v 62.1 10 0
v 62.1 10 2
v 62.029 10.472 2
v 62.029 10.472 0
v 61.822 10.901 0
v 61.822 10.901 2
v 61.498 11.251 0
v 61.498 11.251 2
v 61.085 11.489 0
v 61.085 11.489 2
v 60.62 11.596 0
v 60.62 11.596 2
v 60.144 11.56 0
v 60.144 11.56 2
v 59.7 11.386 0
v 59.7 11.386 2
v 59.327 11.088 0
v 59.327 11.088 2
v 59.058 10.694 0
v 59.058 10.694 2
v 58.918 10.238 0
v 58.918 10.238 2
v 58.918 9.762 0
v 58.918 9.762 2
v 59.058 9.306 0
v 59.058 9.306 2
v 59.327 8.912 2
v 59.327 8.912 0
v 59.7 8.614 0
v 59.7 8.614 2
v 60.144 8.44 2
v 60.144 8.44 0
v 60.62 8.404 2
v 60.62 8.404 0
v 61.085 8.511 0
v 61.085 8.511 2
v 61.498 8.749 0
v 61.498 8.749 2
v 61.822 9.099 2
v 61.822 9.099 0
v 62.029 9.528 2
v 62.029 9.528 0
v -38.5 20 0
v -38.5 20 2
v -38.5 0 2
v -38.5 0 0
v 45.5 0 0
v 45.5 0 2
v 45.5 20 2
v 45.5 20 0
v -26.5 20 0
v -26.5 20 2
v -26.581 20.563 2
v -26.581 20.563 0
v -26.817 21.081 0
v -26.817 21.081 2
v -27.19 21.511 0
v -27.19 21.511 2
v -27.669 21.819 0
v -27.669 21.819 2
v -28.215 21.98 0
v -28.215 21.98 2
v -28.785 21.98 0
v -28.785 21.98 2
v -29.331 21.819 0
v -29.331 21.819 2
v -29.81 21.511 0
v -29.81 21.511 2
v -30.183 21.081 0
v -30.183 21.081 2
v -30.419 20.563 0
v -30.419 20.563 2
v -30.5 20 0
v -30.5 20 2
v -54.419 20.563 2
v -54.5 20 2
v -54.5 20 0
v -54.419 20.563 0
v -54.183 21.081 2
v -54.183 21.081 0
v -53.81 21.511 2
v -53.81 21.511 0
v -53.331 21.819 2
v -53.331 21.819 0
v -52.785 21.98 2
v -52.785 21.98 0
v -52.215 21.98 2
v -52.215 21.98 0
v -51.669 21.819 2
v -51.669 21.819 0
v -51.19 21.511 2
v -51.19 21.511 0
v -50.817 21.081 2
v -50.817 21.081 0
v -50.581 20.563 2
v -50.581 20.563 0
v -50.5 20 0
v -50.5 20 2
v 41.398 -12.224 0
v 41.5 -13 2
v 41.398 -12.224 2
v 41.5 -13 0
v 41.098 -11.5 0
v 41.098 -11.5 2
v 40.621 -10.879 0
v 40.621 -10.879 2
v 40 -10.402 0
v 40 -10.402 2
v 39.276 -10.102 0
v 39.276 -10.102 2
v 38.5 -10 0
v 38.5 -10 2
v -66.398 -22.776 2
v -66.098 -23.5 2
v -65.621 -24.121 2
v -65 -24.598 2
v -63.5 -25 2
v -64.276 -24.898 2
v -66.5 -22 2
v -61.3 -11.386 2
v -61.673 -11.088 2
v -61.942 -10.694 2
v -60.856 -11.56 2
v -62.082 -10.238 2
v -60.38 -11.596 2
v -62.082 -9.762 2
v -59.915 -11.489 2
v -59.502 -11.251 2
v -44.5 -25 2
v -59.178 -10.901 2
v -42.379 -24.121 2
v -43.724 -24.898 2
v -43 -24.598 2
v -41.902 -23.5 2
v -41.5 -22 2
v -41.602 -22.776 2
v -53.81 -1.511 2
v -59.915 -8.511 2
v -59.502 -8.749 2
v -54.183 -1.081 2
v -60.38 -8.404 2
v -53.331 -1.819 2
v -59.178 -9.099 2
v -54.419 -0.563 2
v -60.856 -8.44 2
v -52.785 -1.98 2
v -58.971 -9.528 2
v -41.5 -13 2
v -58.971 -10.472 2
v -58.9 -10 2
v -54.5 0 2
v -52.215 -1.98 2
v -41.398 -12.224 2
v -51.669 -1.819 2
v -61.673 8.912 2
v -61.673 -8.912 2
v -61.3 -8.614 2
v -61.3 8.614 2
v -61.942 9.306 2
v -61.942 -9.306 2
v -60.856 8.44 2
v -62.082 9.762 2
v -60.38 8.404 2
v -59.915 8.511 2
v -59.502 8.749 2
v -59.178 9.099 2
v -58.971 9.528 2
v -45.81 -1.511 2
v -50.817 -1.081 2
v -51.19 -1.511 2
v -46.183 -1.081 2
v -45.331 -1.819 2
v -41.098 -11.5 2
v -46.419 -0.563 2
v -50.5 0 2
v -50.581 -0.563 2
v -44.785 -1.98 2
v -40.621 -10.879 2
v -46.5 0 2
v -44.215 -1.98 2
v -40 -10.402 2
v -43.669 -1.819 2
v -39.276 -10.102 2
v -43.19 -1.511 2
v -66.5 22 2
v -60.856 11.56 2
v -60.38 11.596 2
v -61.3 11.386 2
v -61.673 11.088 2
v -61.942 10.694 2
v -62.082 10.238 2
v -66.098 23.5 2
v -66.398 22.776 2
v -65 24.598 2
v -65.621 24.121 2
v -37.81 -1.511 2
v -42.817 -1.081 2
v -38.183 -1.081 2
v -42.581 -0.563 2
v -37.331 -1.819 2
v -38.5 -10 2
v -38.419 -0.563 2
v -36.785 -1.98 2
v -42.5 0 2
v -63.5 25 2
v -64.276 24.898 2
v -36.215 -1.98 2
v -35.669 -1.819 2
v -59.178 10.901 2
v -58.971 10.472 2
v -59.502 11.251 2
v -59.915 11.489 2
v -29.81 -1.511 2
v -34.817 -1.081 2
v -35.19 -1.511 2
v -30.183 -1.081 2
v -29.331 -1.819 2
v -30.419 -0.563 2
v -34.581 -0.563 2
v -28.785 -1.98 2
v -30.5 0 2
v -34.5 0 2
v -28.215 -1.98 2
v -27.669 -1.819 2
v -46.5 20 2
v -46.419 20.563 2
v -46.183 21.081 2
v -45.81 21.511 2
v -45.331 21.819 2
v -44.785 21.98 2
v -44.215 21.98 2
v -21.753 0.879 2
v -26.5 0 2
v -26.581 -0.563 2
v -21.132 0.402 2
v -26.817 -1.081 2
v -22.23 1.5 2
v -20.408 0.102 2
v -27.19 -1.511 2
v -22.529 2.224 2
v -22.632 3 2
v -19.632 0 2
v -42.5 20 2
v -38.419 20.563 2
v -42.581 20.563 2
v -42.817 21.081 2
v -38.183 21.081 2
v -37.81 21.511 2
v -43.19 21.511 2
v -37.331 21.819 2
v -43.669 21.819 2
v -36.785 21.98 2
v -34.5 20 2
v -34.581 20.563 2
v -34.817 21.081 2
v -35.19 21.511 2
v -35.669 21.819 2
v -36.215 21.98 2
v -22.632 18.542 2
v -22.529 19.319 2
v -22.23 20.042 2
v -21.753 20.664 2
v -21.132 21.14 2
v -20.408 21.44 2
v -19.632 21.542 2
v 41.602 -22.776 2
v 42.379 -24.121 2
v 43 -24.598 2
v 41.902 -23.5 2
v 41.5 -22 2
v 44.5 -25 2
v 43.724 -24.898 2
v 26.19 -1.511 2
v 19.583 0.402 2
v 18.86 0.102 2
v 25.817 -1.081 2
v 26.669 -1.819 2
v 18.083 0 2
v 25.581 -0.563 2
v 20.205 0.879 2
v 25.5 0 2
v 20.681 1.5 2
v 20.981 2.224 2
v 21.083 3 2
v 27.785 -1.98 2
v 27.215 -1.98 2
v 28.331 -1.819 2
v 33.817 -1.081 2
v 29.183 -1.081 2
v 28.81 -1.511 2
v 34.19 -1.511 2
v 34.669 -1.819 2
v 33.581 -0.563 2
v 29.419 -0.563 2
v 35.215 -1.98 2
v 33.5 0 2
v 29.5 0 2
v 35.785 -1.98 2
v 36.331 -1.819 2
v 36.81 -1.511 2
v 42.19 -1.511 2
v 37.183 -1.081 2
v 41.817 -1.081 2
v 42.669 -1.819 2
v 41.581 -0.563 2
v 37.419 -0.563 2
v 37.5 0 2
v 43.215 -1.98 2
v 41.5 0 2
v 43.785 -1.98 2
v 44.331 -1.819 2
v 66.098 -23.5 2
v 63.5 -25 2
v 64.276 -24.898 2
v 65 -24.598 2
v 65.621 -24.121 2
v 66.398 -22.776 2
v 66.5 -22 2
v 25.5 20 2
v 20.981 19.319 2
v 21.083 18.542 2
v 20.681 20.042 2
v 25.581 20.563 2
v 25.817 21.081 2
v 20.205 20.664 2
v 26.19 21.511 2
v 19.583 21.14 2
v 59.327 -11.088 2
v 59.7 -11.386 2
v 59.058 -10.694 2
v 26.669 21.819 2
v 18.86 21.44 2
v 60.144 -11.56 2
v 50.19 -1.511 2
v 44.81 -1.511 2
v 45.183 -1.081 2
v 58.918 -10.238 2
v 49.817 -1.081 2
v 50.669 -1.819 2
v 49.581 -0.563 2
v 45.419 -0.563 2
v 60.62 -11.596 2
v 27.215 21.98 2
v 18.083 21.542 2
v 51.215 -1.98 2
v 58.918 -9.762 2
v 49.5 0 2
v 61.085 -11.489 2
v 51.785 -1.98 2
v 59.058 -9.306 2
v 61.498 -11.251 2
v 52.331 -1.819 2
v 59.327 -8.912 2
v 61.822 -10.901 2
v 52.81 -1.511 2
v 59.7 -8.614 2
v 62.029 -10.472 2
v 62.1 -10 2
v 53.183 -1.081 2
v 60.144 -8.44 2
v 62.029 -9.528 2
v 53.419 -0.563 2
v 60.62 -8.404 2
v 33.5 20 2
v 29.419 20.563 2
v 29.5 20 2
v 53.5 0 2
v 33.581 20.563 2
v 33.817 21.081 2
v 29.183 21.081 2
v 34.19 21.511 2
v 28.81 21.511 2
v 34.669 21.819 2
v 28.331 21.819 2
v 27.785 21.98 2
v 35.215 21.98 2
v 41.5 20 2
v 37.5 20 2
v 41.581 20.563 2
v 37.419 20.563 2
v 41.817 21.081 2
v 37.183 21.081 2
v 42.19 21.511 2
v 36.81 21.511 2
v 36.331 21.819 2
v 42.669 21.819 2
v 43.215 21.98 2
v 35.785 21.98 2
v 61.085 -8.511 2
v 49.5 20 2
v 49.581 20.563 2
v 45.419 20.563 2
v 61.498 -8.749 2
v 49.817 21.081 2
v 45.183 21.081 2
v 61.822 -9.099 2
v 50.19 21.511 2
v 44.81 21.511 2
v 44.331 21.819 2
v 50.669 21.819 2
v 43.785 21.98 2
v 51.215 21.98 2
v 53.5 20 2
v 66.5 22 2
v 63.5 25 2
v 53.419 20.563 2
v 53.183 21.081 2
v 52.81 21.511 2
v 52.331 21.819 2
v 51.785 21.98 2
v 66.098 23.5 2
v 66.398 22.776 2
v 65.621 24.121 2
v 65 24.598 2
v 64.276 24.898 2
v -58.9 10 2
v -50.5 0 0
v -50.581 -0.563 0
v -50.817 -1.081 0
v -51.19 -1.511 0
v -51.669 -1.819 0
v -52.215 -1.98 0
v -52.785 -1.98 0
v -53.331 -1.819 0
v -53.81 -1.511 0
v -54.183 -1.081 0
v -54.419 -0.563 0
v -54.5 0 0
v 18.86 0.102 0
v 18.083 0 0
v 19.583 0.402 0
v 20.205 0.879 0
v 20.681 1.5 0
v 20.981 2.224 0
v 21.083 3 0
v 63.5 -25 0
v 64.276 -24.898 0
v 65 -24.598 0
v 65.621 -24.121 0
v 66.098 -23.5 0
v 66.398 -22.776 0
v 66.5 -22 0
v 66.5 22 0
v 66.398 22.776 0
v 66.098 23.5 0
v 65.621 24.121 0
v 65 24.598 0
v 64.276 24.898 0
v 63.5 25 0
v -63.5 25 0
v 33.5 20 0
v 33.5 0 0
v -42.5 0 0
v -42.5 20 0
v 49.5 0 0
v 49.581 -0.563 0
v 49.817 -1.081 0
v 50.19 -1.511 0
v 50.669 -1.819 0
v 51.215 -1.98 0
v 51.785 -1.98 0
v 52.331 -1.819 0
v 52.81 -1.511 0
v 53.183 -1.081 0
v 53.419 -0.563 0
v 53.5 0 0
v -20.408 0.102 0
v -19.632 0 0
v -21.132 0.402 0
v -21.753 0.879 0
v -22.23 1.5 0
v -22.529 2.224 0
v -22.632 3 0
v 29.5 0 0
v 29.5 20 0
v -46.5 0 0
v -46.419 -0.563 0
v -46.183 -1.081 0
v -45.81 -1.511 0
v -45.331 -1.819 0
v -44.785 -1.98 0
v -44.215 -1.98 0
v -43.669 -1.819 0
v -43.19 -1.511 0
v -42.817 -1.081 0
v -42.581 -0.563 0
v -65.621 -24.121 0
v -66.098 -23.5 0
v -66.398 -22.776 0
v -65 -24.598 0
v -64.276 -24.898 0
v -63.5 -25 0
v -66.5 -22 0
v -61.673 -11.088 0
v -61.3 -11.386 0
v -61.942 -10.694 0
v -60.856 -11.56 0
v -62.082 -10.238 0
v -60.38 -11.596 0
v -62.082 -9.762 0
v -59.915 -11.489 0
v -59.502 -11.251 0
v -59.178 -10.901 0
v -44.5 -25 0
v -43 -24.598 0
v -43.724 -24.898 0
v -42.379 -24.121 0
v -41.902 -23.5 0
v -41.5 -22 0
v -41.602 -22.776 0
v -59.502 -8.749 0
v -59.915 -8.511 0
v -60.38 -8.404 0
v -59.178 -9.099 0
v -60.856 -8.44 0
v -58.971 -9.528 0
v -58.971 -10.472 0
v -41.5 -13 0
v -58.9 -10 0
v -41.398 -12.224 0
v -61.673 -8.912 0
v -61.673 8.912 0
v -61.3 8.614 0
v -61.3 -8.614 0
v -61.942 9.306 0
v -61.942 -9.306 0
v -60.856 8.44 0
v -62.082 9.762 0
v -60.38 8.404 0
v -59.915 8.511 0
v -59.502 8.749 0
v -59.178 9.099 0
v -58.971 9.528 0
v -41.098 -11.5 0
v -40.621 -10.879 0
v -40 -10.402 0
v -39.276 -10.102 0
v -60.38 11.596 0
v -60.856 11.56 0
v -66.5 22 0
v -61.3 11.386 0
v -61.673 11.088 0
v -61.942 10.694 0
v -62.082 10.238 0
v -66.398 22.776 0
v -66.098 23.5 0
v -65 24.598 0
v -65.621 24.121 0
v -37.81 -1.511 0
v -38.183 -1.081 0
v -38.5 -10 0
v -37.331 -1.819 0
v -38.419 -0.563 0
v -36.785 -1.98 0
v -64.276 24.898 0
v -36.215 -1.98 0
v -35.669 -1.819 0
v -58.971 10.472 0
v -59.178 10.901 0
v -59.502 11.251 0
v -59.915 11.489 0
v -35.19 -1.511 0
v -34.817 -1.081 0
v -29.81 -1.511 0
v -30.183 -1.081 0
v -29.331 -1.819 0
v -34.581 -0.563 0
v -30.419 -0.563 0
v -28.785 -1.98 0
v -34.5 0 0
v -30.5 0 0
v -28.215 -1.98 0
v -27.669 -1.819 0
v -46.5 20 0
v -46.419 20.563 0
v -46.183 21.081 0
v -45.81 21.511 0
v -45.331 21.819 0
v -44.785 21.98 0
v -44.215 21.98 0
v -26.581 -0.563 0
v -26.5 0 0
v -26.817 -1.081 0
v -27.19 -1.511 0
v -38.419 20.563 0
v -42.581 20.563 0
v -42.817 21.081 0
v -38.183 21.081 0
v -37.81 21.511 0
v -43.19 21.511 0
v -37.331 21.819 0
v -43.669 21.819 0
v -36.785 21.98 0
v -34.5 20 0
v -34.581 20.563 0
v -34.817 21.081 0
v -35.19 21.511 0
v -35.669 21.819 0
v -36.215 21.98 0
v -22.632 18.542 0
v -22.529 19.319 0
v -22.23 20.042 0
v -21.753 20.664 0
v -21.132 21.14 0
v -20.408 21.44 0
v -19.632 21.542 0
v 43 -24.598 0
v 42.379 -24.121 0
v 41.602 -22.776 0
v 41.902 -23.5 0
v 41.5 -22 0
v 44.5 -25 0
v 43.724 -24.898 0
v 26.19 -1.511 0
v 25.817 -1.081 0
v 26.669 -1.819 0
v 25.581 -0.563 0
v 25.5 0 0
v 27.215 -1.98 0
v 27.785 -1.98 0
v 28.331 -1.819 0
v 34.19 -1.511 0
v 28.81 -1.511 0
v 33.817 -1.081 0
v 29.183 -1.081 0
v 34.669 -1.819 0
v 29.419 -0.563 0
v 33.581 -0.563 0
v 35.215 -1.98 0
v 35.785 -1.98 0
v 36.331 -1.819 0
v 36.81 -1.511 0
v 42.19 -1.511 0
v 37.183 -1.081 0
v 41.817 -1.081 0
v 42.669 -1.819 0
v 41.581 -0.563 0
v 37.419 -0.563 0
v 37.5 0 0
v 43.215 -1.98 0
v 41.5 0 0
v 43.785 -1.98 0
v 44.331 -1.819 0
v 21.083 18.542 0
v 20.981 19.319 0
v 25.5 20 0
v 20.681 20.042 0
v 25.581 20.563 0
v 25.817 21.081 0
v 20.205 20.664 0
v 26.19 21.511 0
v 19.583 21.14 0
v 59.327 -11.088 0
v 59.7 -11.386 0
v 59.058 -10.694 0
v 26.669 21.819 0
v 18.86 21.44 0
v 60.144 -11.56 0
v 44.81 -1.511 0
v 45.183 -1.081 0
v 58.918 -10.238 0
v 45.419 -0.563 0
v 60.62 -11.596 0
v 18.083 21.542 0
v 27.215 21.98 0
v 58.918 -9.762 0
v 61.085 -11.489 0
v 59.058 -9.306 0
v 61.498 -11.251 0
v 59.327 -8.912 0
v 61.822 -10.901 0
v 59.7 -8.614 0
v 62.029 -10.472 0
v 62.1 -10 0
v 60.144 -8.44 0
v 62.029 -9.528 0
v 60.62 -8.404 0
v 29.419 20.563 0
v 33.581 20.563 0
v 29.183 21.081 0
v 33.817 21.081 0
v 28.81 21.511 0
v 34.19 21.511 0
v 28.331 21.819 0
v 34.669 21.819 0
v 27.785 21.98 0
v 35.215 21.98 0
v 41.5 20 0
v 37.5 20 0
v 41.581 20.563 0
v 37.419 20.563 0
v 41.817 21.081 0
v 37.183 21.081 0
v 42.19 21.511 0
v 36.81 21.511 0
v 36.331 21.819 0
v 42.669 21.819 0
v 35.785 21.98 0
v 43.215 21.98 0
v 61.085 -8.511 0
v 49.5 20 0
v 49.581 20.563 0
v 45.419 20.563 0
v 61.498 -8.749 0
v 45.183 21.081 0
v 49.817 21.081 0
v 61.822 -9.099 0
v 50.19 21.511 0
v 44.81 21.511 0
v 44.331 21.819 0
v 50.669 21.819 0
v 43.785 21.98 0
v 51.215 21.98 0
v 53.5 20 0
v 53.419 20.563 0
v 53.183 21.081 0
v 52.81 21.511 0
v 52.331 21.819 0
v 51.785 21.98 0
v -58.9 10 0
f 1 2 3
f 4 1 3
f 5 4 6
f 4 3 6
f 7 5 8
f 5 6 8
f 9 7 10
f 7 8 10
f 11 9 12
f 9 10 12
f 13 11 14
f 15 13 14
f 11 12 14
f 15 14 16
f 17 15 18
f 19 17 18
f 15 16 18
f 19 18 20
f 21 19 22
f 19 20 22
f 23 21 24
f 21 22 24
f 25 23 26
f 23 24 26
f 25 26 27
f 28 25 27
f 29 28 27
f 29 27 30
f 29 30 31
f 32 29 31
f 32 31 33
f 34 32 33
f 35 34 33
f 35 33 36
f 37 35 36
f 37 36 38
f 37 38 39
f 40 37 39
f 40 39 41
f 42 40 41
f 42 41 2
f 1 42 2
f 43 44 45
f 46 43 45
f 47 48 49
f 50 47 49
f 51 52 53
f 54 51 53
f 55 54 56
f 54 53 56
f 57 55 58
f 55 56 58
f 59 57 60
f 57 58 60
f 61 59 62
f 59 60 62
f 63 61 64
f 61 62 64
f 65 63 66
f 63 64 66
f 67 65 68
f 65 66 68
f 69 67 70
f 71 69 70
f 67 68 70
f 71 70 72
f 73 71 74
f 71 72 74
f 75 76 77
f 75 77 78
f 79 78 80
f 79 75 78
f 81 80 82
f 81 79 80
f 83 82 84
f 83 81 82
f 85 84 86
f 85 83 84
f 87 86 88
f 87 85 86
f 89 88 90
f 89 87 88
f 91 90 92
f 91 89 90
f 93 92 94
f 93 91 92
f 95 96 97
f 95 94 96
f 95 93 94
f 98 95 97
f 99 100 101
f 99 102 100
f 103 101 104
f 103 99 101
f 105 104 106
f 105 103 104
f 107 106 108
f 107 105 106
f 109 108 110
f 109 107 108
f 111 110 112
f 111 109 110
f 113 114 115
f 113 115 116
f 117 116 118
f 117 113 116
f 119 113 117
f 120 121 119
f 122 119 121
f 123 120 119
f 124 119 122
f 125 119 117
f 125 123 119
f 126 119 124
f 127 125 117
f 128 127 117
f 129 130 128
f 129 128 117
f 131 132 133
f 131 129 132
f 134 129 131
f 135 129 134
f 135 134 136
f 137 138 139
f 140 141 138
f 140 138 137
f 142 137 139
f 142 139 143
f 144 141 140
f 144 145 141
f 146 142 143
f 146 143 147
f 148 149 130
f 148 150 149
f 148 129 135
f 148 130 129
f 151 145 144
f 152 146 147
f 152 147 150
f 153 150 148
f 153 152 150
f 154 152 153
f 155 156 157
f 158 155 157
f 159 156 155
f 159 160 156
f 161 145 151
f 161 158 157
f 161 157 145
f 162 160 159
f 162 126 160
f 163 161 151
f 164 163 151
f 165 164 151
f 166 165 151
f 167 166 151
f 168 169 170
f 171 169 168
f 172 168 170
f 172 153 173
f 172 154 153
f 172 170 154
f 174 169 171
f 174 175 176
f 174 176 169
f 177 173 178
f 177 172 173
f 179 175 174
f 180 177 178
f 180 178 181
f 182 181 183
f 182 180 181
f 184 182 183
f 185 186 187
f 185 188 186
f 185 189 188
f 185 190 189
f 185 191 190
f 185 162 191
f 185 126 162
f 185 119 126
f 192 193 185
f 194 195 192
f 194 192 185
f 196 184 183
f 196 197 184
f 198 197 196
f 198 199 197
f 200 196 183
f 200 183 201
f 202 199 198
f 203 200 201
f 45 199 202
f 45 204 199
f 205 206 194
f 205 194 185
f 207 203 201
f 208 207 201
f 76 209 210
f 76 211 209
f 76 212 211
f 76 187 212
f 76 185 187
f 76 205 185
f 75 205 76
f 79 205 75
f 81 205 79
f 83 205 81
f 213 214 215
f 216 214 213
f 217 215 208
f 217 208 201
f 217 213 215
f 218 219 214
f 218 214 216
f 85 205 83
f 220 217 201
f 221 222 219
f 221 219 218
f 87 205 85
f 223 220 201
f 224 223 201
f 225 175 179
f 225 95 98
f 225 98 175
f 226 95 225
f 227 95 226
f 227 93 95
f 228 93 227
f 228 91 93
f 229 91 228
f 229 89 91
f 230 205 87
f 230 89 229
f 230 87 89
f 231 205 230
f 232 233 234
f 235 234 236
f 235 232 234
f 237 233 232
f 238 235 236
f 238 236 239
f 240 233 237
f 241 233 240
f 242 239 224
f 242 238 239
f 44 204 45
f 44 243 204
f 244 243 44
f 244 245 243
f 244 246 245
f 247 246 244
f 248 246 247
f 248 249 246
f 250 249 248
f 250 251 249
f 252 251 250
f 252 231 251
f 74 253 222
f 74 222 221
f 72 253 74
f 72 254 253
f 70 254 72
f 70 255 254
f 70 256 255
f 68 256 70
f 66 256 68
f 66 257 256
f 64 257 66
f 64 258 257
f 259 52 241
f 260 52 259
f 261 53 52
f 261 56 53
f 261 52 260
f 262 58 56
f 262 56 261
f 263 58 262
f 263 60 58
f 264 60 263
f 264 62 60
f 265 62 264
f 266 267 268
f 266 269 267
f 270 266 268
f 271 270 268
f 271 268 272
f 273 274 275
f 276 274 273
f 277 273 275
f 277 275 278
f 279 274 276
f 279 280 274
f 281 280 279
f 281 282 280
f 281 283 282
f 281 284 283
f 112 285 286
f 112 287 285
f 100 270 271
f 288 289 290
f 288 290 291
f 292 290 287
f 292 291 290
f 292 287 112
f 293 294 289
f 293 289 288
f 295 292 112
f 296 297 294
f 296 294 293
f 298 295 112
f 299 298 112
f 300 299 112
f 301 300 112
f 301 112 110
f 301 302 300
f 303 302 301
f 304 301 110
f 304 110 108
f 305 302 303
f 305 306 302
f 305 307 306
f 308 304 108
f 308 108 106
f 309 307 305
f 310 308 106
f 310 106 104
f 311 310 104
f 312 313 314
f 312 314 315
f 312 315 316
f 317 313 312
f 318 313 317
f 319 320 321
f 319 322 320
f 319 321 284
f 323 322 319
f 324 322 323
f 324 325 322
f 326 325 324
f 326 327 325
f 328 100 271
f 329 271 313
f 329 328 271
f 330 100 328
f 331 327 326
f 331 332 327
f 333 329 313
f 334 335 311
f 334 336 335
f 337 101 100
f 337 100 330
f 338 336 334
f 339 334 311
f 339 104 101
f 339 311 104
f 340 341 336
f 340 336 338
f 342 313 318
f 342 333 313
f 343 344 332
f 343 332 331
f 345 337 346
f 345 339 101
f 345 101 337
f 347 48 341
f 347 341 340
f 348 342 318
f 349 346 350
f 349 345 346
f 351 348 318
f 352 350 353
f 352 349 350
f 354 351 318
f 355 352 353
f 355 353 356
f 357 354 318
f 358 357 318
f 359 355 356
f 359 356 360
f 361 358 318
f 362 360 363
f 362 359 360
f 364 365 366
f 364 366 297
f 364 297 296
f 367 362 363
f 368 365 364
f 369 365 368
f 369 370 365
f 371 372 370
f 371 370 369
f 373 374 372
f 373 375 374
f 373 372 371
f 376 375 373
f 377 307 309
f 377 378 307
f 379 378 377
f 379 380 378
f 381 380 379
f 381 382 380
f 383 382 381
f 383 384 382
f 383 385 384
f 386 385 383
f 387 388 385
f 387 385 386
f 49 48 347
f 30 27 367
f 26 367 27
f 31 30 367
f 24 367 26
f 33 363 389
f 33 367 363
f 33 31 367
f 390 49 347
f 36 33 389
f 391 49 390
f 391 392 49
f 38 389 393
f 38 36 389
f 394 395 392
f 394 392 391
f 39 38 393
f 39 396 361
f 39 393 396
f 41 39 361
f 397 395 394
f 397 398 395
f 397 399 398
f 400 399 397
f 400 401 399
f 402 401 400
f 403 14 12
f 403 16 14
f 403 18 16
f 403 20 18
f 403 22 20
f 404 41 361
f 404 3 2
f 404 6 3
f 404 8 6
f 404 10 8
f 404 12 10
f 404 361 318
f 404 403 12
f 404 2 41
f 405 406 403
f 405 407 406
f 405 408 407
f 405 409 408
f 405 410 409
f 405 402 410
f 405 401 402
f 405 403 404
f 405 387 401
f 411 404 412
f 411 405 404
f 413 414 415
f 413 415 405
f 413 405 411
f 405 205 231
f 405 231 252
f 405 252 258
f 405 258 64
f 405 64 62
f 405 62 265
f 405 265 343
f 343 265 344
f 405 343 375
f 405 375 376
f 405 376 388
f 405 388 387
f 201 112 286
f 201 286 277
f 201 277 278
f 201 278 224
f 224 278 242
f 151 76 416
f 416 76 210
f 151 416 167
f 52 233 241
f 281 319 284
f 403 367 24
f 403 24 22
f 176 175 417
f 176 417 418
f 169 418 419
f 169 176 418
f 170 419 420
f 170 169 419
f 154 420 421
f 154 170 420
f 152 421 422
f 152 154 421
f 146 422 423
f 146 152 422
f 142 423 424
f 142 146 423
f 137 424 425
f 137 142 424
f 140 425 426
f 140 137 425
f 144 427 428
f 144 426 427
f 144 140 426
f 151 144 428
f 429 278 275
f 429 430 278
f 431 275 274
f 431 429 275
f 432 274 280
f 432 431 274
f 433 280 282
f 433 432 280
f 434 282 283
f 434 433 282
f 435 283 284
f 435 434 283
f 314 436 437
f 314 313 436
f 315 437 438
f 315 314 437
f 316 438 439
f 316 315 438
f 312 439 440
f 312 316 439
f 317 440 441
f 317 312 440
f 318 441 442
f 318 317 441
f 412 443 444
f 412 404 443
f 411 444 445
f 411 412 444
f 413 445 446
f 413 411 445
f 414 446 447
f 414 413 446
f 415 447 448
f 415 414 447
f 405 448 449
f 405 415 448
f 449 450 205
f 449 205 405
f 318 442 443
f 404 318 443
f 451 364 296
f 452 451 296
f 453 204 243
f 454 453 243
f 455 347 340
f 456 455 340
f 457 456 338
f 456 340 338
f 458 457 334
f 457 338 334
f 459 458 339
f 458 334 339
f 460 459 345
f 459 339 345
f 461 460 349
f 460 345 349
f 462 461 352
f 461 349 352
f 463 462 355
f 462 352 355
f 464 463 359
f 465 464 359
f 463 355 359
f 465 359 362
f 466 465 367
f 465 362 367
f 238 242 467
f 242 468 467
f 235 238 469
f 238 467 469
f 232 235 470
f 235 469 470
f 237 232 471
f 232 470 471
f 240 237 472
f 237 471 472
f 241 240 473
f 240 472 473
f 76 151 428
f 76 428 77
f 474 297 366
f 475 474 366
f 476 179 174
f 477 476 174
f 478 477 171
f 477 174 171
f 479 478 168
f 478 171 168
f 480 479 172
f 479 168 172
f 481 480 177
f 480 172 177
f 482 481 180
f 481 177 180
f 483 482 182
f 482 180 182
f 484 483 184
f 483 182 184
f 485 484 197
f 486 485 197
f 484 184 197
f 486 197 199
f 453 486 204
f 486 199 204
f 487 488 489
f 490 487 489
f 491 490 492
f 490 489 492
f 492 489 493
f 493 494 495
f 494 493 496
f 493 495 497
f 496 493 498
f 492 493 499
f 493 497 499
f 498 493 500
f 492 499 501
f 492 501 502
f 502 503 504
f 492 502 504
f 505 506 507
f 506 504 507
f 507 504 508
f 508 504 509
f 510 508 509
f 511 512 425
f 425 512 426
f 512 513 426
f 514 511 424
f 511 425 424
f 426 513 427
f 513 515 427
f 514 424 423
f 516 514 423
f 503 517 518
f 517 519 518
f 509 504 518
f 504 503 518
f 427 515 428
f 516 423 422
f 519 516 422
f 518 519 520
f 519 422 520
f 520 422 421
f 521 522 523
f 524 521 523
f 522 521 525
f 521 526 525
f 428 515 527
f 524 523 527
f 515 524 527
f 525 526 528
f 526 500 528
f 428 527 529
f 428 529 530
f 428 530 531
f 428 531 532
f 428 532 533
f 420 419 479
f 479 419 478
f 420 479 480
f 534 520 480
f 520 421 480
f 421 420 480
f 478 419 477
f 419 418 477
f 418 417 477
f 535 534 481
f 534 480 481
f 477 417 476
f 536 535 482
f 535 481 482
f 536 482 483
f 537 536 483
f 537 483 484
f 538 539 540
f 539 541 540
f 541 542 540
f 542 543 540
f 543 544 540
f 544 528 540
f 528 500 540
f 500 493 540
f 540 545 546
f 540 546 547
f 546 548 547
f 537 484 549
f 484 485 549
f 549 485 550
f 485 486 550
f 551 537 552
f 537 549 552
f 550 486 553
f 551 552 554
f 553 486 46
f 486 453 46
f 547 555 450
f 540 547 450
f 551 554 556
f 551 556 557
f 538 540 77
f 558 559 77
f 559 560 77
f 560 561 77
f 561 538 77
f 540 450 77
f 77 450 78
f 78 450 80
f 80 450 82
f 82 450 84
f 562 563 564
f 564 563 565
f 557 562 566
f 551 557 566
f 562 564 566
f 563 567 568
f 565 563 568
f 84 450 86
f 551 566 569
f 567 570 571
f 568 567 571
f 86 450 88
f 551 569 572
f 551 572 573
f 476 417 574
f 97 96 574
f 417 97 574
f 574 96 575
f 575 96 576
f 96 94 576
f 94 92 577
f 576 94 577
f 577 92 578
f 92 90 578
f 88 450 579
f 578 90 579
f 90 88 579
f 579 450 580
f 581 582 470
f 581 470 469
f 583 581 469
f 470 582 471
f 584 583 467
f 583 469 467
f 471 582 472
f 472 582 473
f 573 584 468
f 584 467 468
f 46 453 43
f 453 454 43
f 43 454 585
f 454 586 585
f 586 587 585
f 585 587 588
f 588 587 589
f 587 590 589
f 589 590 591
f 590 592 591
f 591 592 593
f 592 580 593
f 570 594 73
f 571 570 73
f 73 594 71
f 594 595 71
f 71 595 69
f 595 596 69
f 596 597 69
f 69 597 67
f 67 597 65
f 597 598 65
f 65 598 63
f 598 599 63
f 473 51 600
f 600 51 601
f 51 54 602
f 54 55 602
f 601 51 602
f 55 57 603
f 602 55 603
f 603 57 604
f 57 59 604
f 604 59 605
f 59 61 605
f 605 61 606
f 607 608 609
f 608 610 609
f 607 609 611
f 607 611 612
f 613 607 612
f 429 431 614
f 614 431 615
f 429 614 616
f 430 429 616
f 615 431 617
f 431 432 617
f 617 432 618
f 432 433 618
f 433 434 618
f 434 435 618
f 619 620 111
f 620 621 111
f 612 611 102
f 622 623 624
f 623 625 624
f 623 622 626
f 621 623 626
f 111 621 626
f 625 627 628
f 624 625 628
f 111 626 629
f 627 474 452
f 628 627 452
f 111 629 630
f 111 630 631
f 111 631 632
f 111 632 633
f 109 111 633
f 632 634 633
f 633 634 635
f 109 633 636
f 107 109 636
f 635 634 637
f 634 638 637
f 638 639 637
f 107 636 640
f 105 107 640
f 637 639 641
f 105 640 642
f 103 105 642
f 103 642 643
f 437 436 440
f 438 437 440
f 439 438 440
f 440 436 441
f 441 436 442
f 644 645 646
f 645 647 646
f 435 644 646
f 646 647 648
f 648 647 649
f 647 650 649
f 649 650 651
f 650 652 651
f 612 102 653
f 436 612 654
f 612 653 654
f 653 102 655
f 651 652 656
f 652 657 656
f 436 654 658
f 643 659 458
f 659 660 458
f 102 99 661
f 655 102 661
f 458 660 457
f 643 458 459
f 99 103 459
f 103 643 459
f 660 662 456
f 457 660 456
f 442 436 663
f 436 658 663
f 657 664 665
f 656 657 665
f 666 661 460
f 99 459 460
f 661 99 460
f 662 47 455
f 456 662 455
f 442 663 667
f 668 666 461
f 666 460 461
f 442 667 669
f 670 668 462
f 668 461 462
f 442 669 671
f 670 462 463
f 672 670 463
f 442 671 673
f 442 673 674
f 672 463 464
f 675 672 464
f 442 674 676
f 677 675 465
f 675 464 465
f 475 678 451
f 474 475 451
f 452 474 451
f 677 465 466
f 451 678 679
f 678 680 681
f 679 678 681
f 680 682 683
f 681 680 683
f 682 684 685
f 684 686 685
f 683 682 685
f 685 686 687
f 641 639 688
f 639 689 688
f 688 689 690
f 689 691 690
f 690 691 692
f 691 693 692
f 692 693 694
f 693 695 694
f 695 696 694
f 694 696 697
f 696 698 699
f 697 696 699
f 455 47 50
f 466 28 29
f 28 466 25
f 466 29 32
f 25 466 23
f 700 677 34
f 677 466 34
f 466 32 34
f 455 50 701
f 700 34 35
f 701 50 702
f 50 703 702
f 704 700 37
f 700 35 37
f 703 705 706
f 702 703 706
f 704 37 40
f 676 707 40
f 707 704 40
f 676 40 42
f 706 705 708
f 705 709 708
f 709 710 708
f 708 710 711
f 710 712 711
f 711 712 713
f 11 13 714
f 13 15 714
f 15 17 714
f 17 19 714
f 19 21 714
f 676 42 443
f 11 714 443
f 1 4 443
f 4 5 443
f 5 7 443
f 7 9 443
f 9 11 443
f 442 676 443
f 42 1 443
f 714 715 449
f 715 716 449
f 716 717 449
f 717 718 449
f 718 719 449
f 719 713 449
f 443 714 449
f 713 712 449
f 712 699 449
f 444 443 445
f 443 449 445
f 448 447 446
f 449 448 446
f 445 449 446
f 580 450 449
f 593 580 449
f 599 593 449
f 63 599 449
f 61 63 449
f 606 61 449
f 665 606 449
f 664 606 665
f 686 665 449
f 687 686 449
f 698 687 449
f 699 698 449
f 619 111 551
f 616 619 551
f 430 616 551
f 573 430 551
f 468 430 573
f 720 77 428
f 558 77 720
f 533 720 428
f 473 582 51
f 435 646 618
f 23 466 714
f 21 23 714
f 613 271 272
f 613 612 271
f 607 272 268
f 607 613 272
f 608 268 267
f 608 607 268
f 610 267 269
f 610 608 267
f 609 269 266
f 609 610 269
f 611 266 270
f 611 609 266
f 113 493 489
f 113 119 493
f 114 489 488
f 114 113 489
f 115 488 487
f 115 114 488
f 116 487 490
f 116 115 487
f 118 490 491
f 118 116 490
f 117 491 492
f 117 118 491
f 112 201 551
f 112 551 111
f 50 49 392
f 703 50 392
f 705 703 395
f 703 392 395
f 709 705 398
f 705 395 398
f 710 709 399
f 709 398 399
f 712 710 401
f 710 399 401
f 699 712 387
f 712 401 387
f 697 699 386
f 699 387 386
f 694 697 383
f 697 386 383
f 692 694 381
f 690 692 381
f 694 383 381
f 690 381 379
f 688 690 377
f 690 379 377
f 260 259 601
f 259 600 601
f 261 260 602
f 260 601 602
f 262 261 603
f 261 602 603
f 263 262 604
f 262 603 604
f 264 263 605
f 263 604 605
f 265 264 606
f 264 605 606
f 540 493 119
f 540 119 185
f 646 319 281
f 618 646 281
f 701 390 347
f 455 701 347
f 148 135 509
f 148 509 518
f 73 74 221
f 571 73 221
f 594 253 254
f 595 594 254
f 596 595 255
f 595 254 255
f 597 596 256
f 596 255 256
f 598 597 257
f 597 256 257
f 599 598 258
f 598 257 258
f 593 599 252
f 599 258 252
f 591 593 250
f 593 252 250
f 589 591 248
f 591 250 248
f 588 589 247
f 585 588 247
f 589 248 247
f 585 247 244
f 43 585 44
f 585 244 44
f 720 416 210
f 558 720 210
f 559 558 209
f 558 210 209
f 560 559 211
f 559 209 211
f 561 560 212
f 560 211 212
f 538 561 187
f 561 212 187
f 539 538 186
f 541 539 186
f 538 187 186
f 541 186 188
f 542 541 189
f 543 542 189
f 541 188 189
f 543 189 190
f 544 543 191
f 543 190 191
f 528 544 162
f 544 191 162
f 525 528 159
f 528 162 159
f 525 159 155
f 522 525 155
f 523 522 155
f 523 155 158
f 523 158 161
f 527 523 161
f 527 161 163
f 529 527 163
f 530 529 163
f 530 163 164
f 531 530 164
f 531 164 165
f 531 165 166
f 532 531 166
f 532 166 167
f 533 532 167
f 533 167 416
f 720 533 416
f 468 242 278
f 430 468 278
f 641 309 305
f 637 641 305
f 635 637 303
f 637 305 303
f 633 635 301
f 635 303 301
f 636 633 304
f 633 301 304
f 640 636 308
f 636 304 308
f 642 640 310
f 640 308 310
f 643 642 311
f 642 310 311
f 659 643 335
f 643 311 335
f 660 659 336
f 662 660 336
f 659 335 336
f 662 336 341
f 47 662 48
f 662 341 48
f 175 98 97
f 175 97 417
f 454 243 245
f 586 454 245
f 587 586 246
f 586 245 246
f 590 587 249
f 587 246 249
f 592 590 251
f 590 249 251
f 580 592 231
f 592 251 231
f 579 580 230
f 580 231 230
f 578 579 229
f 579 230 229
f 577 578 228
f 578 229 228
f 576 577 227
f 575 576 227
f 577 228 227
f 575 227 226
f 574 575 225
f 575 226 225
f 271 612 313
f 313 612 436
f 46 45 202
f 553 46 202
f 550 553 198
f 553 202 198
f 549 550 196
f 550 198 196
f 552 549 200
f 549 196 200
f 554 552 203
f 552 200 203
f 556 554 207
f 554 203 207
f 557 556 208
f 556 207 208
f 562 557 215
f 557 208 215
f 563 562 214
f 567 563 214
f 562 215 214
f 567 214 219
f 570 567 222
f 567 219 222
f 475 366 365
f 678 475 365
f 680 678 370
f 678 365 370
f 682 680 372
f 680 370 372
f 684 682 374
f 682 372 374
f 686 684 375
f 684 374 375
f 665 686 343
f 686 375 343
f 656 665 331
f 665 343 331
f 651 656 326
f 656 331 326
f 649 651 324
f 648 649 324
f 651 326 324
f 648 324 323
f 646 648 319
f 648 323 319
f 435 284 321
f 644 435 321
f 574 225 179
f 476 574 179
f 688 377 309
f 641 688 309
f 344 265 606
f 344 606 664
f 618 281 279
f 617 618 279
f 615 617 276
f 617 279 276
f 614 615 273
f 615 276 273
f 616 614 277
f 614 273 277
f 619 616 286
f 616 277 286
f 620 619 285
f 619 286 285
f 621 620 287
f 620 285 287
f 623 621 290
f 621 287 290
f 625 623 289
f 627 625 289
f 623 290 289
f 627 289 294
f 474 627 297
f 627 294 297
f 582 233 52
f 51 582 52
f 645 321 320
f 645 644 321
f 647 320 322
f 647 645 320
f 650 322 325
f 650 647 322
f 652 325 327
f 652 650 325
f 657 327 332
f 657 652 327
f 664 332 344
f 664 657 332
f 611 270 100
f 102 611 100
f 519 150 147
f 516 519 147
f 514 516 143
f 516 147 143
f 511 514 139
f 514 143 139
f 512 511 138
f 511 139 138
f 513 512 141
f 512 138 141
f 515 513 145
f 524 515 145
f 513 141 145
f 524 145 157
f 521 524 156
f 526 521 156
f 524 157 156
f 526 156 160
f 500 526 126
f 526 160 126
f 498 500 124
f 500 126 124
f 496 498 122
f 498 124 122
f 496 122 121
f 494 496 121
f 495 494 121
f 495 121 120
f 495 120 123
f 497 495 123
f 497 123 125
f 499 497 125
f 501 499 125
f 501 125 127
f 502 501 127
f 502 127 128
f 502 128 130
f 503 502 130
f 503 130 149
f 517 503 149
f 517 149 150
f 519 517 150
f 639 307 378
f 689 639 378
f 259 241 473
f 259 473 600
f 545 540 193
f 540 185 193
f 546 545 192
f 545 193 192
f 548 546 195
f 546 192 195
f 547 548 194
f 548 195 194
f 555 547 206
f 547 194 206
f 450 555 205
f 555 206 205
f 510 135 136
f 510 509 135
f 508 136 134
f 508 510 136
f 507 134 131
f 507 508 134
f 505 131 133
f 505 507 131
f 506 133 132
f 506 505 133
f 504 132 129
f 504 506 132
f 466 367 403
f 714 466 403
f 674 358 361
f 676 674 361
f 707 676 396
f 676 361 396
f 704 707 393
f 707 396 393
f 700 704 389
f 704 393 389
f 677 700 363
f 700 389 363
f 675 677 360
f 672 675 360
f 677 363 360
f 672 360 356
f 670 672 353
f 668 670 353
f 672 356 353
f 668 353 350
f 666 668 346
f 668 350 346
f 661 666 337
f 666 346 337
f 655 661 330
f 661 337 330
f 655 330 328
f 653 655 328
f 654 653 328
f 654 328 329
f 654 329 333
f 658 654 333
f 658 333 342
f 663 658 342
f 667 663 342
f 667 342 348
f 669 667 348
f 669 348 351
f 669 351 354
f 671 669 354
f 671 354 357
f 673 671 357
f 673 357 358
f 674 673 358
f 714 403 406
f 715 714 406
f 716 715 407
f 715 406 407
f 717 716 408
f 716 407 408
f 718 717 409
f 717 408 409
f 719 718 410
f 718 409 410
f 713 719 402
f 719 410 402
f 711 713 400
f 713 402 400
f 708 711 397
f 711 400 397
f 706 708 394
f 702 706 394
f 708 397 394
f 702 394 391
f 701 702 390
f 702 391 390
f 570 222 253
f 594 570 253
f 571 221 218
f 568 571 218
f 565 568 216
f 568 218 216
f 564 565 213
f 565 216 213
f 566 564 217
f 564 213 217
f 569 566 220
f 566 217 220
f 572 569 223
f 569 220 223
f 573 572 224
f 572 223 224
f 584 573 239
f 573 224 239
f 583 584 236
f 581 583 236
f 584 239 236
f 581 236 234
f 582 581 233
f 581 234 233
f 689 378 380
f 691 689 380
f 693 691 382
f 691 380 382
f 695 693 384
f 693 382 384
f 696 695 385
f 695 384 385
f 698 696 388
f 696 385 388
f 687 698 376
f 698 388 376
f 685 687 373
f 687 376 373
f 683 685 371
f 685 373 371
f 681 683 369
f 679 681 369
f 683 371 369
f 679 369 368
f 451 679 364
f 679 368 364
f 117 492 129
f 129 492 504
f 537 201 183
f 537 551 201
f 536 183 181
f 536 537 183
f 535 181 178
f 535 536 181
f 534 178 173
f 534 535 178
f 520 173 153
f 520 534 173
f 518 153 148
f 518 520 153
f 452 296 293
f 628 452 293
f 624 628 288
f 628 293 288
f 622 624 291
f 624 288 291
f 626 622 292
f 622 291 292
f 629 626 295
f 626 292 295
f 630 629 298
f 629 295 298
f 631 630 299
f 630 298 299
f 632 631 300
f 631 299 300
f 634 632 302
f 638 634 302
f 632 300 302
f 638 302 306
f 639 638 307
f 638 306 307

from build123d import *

# Parameters (mm, degrees)
SKETCH_1_W          = 133
SKETCH_1_H          = 50
EXTRUDE_1_DEPTH     = 2
FILLET_1_R          = 3
SKETCH_2_R          = 1.6
CUT_EXTRUDE_1_DEPTH = 3
SKETCH_3_W          = 43.714876359
SKETCH_3_H          = 21.542228592
CUT_EXTRUDE_2_DEPTH = 10
SKETCH_4_W          = 83
SKETCH_4_H          = 15
CUT_EXTRUDE_3_DEPTH = 10
FILLET_3_R          = 3
FILLET_4_R          = 3


with BuildPart() as part:
    # 草图1 → 凸台-拉伸1 (new body)
    with BuildSketch(Plane.XY):
        Rectangle(SKETCH_1_W, SKETCH_1_H)
    extrude(amount=EXTRUDE_1_DEPTH)

    # 圆角1
    fillet_1_edges = [part.edges().sort_by_distance(p)[0] for p in [
        (-66.5, 25, 1),
        (66.5, 25, 1),
        (66.5, -25, 1),
        (-66.5, -25, 1),
    ]]
    fillet(fillet_1_edges, radius=FILLET_1_R)

    # 草图2 → 切除-拉伸1 (cut)
    with BuildSketch(Plane.XY.offset(2)):
        with Locations((-60.5, 10)):
            Circle(SKETCH_2_R)
        with Locations((-60.5, -10)):
            Circle(SKETCH_2_R)
        with Locations((60.5, -10)):
            Circle(SKETCH_2_R)
        with Locations((60.5, 10)):
            Circle(SKETCH_2_R)
    extrude(amount=-CUT_EXTRUDE_1_DEPTH, mode=Mode.SUBTRACT)

    # 草图3 → 切除-拉伸2 (cut)
    with BuildSketch(Plane.XY.offset(2)):
        with BuildLine():
            Line((-50.5, 20), (-50.5, 0))
            ThreePointArc((-50.5, 0), (-52.5, -2), (-54.5, 0))
            Line((-54.5, 0), (-54.5, 20))
            ThreePointArc((-54.5, 20), (-52.5, 22), (-50.5, 20))
        make_face()
        with BuildLine():
            Line((-46.5, 20), (-46.5, 0))
            ThreePointArc((-46.5, 0), (-44.5, -2), (-42.5, 0))
            Line((-42.5, 0), (-42.5, 20))
            ThreePointArc((-42.5, 20), (-44.5, 22), (-46.5, 20))
        make_face()
        with BuildLine():
            Line((-38.5, 20), (-38.5, 0))
            ThreePointArc((-38.5, 0), (-36.5, -2), (-34.5, 0))
            Line((-34.5, 0), (-34.5, 20))
            ThreePointArc((-34.5, 20), (-36.5, 22), (-38.5, 20))
        make_face()
        with BuildLine():
            Line((-30.5, 20), (-30.5, 0))
            ThreePointArc((-30.5, 0), (-28.5, -2), (-26.5, 0))
            Line((-26.5, 0), (-26.5, 20))
            ThreePointArc((-26.5, 20), (-28.5, 22), (-30.5, 20))
        make_face()
        with Locations((-0.774062545, 10.771114296)):
            Rectangle(SKETCH_3_W, SKETCH_3_H)
        with BuildLine():
            Line((25.5, 20), (25.5, 0))
            ThreePointArc((25.5, 0), (27.5, -2), (29.5, 0))
            Line((29.5, 0), (29.5, 20))
            ThreePointArc((29.5, 20), (27.5, 22), (25.5, 20))
        make_face()
        with BuildLine():
            Line((33.5, 20), (33.5, 0))
            ThreePointArc((33.5, 0), (35.5, -2), (37.5, 0))
            Line((37.5, 0), (37.5, 20))
            ThreePointArc((37.5, 20), (35.5, 22), (33.5, 20))
        make_face()
        with BuildLine():
            Line((41.5, 20), (41.5, 0))
            ThreePointArc((41.5, 0), (43.5, -2), (45.5, 0))
            Line((45.5, 0), (45.5, 20))
            ThreePointArc((45.5, 20), (43.5, 22), (41.5, 20))
        make_face()
        with BuildLine():
            Line((49.5, 20), (49.5, 0))
            ThreePointArc((49.5, 0), (51.5, -2), (53.5, 0))
            Line((53.5, 0), (53.5, 20))
            ThreePointArc((53.5, 20), (51.5, 22), (49.5, 20))
        make_face()
    extrude(amount=-CUT_EXTRUDE_2_DEPTH, mode=Mode.SUBTRACT)

    # 草图4 → 切除-拉伸3 (cut)
    with BuildSketch(Plane.XY.offset(2)):
        with Locations((0, -17.5)):
            Rectangle(SKETCH_4_W, SKETCH_4_H)
    extrude(amount=-CUT_EXTRUDE_3_DEPTH, mode=Mode.SUBTRACT)

    # 圆角3
    fillet_3_edges = [part.edges().sort_by_distance(p)[0] for p in [
        (-41.5, -25, 1),
        (-41.5, -10, 1),
        (41.5, -10, 1),
        (41.5, -25, 1),
    ]]
    fillet(fillet_3_edges, radius=FILLET_3_R)

    # 圆角4
    fillet_4_edges = [part.edges().sort_by_distance(p)[0] for p in [
        (-22.631500725, 0, 1),
        (-22.631500725, 21.542228592, 1),
        (21.083375634, 21.542228592, 1),
        (21.083375634, 0, 1),
    ]]
    fillet(fillet_4_edges, radius=FILLET_4_R)


solid = part.part
